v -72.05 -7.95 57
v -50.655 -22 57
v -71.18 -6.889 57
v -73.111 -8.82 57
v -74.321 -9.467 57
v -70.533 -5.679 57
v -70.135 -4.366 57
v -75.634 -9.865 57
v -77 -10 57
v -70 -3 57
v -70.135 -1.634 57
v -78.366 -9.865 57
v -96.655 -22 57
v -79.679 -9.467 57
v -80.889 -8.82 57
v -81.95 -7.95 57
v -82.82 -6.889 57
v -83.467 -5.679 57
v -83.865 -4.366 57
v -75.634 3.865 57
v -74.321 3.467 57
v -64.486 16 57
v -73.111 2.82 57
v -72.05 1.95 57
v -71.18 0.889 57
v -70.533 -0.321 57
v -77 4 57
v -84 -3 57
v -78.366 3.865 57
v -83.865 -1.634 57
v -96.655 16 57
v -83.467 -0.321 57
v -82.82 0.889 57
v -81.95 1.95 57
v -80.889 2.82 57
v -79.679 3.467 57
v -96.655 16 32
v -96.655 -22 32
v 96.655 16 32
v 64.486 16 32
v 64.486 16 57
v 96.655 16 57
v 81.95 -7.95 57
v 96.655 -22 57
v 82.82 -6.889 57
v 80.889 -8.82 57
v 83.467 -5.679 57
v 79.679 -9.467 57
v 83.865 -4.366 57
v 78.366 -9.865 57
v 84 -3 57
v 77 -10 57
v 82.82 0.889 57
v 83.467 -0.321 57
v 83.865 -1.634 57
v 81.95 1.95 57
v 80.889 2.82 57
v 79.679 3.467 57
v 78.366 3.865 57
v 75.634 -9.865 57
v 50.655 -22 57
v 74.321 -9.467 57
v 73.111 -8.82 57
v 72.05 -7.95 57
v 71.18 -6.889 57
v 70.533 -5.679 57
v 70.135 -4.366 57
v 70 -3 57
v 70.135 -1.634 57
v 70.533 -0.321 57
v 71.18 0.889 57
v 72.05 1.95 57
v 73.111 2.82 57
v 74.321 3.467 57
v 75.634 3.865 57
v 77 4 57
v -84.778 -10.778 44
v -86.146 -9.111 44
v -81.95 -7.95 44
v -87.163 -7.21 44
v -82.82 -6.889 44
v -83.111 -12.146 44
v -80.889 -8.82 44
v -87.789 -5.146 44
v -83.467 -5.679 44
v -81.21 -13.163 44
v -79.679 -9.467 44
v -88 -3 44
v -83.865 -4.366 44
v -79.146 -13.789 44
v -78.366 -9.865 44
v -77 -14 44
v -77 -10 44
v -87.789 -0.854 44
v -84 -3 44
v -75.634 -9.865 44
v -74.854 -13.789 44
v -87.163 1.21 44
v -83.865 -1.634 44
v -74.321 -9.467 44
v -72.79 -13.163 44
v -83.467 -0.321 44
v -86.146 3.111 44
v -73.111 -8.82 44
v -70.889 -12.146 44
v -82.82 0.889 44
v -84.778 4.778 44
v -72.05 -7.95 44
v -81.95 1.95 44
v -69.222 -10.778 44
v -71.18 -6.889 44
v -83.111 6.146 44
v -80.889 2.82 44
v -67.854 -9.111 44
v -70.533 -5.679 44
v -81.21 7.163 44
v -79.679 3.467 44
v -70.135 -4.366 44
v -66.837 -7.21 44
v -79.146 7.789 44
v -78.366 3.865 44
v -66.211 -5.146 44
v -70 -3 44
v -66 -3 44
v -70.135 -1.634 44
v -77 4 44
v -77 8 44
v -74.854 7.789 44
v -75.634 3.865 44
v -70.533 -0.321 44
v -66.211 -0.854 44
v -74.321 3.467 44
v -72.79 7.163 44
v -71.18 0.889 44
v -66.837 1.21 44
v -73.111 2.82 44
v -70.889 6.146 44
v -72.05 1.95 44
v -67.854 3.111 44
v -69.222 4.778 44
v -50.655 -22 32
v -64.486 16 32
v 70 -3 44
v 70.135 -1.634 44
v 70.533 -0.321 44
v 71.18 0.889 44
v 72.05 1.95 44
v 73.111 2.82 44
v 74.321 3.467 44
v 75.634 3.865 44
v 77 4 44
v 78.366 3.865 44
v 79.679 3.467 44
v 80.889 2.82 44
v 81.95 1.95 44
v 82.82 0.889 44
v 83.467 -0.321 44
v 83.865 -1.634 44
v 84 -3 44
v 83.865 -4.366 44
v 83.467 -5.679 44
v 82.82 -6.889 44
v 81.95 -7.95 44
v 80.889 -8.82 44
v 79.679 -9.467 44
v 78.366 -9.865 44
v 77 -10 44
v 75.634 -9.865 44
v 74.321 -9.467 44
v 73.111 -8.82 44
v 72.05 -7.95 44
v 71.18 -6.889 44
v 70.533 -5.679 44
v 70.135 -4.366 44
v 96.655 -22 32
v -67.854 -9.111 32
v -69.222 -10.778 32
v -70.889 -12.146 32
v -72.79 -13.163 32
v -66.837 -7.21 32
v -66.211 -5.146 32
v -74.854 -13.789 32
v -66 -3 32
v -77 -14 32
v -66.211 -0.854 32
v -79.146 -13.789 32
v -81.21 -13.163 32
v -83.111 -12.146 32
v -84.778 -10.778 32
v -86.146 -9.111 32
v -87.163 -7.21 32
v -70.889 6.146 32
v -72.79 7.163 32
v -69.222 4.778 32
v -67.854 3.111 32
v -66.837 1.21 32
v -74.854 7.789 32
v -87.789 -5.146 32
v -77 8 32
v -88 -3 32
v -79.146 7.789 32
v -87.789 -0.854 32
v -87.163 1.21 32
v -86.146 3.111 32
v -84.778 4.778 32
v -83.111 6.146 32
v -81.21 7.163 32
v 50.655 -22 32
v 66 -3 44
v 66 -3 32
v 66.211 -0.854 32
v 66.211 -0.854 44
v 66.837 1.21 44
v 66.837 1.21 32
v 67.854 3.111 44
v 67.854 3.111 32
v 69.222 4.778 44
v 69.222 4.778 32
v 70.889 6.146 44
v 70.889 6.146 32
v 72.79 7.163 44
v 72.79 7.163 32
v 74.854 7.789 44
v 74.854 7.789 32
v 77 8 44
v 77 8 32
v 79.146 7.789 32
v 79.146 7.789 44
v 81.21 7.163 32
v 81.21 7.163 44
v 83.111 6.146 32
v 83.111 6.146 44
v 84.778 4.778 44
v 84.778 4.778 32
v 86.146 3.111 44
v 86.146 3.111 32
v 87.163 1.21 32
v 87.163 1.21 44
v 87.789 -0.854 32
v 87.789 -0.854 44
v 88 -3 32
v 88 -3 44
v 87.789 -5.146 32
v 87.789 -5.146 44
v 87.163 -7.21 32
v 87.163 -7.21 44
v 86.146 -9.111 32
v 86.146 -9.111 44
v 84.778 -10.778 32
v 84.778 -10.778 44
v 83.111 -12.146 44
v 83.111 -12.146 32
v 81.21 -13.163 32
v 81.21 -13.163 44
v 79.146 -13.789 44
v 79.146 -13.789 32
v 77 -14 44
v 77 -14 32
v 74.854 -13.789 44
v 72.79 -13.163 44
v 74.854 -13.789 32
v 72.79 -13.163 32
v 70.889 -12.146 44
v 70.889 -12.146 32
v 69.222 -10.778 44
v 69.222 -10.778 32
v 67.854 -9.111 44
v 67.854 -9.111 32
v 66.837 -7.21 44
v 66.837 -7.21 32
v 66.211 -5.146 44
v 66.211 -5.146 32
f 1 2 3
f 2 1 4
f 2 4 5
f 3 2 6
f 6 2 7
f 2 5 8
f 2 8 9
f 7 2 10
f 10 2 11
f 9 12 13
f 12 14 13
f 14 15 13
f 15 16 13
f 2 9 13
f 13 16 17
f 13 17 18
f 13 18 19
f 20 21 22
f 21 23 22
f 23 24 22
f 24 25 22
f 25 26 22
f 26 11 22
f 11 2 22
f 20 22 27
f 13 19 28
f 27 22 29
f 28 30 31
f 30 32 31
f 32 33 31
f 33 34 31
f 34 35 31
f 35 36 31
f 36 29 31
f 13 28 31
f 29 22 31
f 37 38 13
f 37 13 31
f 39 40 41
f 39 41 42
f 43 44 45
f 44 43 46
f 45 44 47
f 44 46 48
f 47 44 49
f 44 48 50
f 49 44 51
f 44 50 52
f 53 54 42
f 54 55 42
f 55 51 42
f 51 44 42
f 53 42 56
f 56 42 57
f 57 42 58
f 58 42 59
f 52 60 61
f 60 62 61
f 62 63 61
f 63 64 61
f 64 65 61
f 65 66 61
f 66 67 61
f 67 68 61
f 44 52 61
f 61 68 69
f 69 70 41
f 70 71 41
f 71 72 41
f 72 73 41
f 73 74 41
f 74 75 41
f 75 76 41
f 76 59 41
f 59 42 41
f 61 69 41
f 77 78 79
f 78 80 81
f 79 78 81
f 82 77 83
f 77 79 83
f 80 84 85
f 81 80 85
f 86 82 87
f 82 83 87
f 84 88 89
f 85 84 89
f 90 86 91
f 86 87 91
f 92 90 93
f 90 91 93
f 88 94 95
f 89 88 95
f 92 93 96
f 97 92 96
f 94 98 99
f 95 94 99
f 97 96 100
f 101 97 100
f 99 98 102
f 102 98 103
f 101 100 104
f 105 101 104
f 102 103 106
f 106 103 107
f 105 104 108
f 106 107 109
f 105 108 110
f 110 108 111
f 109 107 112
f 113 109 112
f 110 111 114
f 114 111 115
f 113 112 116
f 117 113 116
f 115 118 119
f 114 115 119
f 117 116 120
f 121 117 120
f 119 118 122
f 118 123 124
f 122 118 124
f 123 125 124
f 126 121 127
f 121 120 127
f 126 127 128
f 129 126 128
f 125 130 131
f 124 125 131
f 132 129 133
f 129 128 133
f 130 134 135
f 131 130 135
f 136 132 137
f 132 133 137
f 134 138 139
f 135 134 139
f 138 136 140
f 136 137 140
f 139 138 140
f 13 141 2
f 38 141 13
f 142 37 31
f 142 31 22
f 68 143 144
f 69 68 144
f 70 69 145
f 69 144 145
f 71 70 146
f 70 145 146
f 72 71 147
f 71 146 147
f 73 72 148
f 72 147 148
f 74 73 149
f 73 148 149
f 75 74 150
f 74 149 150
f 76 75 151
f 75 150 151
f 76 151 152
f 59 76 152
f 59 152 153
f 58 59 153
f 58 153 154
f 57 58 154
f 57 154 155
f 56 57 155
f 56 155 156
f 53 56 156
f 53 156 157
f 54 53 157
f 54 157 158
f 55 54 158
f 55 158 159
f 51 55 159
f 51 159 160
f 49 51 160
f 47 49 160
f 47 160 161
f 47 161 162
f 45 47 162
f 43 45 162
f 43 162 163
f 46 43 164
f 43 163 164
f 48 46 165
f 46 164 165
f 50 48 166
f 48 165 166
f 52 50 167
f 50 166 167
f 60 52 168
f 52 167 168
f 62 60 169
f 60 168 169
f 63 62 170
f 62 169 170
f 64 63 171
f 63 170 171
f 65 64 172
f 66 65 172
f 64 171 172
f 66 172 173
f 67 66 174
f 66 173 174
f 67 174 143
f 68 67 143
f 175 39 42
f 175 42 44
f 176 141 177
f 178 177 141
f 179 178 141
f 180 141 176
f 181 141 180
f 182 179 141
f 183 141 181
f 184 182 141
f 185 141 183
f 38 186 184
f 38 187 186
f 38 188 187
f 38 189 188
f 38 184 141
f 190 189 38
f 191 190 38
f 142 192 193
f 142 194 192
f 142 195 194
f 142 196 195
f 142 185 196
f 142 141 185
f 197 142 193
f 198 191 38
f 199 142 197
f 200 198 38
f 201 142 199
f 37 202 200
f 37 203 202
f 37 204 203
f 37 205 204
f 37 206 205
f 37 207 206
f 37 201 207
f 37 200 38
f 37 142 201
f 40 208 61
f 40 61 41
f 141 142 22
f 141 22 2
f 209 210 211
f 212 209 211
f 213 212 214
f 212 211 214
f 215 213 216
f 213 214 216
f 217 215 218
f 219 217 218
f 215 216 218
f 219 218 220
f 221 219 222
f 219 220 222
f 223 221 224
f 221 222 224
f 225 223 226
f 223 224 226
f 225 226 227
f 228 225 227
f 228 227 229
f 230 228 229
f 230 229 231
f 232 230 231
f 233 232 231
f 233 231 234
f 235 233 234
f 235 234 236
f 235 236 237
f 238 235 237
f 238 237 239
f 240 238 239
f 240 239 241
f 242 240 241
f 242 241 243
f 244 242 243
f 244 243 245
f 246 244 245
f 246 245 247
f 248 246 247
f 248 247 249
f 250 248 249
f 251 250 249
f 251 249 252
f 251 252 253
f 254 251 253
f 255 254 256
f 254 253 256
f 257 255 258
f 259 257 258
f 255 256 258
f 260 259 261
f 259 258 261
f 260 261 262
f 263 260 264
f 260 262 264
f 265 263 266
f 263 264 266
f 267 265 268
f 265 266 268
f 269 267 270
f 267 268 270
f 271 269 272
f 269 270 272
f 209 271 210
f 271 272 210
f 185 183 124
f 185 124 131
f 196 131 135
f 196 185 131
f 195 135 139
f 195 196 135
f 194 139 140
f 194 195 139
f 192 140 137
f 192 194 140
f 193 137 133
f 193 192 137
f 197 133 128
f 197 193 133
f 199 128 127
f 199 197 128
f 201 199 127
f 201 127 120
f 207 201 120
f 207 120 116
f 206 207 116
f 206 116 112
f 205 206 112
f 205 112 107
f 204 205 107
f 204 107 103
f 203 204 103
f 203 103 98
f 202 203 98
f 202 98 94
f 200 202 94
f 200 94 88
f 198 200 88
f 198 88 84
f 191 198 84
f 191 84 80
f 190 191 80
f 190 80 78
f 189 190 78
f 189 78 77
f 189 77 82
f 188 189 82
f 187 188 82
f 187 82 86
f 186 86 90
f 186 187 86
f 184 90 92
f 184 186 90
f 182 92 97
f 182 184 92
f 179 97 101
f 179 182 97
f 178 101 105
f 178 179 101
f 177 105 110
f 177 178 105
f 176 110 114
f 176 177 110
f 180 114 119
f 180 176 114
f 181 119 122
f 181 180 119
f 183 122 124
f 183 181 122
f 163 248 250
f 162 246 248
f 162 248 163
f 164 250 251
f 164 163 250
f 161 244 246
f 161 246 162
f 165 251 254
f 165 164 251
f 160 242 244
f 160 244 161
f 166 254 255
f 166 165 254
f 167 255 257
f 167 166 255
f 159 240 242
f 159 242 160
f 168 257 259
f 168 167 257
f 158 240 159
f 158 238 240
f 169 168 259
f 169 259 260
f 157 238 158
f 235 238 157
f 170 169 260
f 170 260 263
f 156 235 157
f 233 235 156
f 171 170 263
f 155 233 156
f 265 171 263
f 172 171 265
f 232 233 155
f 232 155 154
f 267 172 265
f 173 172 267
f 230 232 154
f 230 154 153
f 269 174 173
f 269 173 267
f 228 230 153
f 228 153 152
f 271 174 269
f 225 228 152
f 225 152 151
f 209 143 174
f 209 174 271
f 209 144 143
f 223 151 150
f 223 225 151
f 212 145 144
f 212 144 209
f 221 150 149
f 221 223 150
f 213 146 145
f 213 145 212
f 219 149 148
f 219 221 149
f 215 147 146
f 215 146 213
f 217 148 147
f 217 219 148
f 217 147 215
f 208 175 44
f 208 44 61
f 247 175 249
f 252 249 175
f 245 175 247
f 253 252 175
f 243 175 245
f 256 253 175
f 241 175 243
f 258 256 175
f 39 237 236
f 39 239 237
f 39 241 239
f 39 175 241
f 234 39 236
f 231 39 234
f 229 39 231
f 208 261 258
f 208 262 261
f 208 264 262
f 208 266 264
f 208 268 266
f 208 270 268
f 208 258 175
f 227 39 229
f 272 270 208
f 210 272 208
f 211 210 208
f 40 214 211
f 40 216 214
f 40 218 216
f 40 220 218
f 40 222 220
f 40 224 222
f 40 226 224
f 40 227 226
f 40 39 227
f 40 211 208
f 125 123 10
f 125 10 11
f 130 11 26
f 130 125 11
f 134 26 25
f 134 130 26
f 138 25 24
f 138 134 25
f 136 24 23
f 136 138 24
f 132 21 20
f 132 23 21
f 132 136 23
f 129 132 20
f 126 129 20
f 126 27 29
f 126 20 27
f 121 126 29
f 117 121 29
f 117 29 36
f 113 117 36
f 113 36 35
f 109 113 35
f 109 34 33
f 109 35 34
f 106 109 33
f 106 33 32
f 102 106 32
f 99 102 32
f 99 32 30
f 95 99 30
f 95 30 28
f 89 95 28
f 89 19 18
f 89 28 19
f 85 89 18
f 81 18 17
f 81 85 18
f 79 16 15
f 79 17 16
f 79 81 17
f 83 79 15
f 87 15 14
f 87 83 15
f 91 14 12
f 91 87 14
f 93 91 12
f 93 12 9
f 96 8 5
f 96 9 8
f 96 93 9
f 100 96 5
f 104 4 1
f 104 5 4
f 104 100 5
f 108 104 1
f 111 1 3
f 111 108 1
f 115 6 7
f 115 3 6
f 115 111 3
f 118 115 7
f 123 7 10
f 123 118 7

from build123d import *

# Parameters (mm, degrees)
CYLINDER004_R     = 7
CYLINDER004_DEPTH = 150
CYLINDER003_R     = 11
CYLINDER003_DEPTH = 31
PAD011_DEPTH      = 25


with BuildPart() as axe:
    # Cylinder004 → Cylinder004 (new body)
    with BuildSketch(Plane.XY.offset(-50)):
        Circle(CYLINDER004_R)
    extrude(amount=CYLINDER004_DEPTH)


with BuildPart() as clone_of_ball_slider:
    # Cylinder003 → Cylinder003 (new body)
    with BuildSketch(Plane.XY):
        Circle(CYLINDER003_R)
    extrude(amount=CYLINDER003_DEPTH)

    # Fusion003: union axe
    add(axe.part)


with BuildPart() as clone_of_ball_slider_1:
    # Clone017 placement: moved
    add(clone_of_ball_slider.part.moved(Location((-77, -3, 13))))


with BuildPart() as part_mirroring002:
    # Part__Mirroring002: instance of Clone of ball slider
    add(clone_of_ball_slider_1.part.mirror(Plane(origin=(0, 0, 0), x_dir=(0, -1, 0), z_dir=(1, 0, 0))))


with BuildPart() as ball_sliders:
    # Fusion004 base: copy of Clone of ball slider
    add(clone_of_ball_slider_1.part)

    # Fusion004: union Part__Mirroring002
    add(part_mirroring002.part)


with BuildPart() as cut006008:
    # Sketch010 → Pad011 (new body)
    with BuildSketch(Plane.XY):
        Polygon((-96.65489, 16), (-64.485759, 16), (-50.65489, -22), (-96.65489, -22), align=None)
        Polygon((64.485759, 16), (96.65489, 16), (96.65489, -22), (50.65489, -22), align=None)
    extrude(amount=PAD011_DEPTH)


with BuildPart() as cut006008_1:
    # Clone014 placement: moved
    add(cut006008.part.moved(Location((0, 0, 32))))

    # Cut006008: cut ball_sliders
    add(ball_sliders.part, mode=Mode.SUBTRACT)


solid = cut006008_1.part
